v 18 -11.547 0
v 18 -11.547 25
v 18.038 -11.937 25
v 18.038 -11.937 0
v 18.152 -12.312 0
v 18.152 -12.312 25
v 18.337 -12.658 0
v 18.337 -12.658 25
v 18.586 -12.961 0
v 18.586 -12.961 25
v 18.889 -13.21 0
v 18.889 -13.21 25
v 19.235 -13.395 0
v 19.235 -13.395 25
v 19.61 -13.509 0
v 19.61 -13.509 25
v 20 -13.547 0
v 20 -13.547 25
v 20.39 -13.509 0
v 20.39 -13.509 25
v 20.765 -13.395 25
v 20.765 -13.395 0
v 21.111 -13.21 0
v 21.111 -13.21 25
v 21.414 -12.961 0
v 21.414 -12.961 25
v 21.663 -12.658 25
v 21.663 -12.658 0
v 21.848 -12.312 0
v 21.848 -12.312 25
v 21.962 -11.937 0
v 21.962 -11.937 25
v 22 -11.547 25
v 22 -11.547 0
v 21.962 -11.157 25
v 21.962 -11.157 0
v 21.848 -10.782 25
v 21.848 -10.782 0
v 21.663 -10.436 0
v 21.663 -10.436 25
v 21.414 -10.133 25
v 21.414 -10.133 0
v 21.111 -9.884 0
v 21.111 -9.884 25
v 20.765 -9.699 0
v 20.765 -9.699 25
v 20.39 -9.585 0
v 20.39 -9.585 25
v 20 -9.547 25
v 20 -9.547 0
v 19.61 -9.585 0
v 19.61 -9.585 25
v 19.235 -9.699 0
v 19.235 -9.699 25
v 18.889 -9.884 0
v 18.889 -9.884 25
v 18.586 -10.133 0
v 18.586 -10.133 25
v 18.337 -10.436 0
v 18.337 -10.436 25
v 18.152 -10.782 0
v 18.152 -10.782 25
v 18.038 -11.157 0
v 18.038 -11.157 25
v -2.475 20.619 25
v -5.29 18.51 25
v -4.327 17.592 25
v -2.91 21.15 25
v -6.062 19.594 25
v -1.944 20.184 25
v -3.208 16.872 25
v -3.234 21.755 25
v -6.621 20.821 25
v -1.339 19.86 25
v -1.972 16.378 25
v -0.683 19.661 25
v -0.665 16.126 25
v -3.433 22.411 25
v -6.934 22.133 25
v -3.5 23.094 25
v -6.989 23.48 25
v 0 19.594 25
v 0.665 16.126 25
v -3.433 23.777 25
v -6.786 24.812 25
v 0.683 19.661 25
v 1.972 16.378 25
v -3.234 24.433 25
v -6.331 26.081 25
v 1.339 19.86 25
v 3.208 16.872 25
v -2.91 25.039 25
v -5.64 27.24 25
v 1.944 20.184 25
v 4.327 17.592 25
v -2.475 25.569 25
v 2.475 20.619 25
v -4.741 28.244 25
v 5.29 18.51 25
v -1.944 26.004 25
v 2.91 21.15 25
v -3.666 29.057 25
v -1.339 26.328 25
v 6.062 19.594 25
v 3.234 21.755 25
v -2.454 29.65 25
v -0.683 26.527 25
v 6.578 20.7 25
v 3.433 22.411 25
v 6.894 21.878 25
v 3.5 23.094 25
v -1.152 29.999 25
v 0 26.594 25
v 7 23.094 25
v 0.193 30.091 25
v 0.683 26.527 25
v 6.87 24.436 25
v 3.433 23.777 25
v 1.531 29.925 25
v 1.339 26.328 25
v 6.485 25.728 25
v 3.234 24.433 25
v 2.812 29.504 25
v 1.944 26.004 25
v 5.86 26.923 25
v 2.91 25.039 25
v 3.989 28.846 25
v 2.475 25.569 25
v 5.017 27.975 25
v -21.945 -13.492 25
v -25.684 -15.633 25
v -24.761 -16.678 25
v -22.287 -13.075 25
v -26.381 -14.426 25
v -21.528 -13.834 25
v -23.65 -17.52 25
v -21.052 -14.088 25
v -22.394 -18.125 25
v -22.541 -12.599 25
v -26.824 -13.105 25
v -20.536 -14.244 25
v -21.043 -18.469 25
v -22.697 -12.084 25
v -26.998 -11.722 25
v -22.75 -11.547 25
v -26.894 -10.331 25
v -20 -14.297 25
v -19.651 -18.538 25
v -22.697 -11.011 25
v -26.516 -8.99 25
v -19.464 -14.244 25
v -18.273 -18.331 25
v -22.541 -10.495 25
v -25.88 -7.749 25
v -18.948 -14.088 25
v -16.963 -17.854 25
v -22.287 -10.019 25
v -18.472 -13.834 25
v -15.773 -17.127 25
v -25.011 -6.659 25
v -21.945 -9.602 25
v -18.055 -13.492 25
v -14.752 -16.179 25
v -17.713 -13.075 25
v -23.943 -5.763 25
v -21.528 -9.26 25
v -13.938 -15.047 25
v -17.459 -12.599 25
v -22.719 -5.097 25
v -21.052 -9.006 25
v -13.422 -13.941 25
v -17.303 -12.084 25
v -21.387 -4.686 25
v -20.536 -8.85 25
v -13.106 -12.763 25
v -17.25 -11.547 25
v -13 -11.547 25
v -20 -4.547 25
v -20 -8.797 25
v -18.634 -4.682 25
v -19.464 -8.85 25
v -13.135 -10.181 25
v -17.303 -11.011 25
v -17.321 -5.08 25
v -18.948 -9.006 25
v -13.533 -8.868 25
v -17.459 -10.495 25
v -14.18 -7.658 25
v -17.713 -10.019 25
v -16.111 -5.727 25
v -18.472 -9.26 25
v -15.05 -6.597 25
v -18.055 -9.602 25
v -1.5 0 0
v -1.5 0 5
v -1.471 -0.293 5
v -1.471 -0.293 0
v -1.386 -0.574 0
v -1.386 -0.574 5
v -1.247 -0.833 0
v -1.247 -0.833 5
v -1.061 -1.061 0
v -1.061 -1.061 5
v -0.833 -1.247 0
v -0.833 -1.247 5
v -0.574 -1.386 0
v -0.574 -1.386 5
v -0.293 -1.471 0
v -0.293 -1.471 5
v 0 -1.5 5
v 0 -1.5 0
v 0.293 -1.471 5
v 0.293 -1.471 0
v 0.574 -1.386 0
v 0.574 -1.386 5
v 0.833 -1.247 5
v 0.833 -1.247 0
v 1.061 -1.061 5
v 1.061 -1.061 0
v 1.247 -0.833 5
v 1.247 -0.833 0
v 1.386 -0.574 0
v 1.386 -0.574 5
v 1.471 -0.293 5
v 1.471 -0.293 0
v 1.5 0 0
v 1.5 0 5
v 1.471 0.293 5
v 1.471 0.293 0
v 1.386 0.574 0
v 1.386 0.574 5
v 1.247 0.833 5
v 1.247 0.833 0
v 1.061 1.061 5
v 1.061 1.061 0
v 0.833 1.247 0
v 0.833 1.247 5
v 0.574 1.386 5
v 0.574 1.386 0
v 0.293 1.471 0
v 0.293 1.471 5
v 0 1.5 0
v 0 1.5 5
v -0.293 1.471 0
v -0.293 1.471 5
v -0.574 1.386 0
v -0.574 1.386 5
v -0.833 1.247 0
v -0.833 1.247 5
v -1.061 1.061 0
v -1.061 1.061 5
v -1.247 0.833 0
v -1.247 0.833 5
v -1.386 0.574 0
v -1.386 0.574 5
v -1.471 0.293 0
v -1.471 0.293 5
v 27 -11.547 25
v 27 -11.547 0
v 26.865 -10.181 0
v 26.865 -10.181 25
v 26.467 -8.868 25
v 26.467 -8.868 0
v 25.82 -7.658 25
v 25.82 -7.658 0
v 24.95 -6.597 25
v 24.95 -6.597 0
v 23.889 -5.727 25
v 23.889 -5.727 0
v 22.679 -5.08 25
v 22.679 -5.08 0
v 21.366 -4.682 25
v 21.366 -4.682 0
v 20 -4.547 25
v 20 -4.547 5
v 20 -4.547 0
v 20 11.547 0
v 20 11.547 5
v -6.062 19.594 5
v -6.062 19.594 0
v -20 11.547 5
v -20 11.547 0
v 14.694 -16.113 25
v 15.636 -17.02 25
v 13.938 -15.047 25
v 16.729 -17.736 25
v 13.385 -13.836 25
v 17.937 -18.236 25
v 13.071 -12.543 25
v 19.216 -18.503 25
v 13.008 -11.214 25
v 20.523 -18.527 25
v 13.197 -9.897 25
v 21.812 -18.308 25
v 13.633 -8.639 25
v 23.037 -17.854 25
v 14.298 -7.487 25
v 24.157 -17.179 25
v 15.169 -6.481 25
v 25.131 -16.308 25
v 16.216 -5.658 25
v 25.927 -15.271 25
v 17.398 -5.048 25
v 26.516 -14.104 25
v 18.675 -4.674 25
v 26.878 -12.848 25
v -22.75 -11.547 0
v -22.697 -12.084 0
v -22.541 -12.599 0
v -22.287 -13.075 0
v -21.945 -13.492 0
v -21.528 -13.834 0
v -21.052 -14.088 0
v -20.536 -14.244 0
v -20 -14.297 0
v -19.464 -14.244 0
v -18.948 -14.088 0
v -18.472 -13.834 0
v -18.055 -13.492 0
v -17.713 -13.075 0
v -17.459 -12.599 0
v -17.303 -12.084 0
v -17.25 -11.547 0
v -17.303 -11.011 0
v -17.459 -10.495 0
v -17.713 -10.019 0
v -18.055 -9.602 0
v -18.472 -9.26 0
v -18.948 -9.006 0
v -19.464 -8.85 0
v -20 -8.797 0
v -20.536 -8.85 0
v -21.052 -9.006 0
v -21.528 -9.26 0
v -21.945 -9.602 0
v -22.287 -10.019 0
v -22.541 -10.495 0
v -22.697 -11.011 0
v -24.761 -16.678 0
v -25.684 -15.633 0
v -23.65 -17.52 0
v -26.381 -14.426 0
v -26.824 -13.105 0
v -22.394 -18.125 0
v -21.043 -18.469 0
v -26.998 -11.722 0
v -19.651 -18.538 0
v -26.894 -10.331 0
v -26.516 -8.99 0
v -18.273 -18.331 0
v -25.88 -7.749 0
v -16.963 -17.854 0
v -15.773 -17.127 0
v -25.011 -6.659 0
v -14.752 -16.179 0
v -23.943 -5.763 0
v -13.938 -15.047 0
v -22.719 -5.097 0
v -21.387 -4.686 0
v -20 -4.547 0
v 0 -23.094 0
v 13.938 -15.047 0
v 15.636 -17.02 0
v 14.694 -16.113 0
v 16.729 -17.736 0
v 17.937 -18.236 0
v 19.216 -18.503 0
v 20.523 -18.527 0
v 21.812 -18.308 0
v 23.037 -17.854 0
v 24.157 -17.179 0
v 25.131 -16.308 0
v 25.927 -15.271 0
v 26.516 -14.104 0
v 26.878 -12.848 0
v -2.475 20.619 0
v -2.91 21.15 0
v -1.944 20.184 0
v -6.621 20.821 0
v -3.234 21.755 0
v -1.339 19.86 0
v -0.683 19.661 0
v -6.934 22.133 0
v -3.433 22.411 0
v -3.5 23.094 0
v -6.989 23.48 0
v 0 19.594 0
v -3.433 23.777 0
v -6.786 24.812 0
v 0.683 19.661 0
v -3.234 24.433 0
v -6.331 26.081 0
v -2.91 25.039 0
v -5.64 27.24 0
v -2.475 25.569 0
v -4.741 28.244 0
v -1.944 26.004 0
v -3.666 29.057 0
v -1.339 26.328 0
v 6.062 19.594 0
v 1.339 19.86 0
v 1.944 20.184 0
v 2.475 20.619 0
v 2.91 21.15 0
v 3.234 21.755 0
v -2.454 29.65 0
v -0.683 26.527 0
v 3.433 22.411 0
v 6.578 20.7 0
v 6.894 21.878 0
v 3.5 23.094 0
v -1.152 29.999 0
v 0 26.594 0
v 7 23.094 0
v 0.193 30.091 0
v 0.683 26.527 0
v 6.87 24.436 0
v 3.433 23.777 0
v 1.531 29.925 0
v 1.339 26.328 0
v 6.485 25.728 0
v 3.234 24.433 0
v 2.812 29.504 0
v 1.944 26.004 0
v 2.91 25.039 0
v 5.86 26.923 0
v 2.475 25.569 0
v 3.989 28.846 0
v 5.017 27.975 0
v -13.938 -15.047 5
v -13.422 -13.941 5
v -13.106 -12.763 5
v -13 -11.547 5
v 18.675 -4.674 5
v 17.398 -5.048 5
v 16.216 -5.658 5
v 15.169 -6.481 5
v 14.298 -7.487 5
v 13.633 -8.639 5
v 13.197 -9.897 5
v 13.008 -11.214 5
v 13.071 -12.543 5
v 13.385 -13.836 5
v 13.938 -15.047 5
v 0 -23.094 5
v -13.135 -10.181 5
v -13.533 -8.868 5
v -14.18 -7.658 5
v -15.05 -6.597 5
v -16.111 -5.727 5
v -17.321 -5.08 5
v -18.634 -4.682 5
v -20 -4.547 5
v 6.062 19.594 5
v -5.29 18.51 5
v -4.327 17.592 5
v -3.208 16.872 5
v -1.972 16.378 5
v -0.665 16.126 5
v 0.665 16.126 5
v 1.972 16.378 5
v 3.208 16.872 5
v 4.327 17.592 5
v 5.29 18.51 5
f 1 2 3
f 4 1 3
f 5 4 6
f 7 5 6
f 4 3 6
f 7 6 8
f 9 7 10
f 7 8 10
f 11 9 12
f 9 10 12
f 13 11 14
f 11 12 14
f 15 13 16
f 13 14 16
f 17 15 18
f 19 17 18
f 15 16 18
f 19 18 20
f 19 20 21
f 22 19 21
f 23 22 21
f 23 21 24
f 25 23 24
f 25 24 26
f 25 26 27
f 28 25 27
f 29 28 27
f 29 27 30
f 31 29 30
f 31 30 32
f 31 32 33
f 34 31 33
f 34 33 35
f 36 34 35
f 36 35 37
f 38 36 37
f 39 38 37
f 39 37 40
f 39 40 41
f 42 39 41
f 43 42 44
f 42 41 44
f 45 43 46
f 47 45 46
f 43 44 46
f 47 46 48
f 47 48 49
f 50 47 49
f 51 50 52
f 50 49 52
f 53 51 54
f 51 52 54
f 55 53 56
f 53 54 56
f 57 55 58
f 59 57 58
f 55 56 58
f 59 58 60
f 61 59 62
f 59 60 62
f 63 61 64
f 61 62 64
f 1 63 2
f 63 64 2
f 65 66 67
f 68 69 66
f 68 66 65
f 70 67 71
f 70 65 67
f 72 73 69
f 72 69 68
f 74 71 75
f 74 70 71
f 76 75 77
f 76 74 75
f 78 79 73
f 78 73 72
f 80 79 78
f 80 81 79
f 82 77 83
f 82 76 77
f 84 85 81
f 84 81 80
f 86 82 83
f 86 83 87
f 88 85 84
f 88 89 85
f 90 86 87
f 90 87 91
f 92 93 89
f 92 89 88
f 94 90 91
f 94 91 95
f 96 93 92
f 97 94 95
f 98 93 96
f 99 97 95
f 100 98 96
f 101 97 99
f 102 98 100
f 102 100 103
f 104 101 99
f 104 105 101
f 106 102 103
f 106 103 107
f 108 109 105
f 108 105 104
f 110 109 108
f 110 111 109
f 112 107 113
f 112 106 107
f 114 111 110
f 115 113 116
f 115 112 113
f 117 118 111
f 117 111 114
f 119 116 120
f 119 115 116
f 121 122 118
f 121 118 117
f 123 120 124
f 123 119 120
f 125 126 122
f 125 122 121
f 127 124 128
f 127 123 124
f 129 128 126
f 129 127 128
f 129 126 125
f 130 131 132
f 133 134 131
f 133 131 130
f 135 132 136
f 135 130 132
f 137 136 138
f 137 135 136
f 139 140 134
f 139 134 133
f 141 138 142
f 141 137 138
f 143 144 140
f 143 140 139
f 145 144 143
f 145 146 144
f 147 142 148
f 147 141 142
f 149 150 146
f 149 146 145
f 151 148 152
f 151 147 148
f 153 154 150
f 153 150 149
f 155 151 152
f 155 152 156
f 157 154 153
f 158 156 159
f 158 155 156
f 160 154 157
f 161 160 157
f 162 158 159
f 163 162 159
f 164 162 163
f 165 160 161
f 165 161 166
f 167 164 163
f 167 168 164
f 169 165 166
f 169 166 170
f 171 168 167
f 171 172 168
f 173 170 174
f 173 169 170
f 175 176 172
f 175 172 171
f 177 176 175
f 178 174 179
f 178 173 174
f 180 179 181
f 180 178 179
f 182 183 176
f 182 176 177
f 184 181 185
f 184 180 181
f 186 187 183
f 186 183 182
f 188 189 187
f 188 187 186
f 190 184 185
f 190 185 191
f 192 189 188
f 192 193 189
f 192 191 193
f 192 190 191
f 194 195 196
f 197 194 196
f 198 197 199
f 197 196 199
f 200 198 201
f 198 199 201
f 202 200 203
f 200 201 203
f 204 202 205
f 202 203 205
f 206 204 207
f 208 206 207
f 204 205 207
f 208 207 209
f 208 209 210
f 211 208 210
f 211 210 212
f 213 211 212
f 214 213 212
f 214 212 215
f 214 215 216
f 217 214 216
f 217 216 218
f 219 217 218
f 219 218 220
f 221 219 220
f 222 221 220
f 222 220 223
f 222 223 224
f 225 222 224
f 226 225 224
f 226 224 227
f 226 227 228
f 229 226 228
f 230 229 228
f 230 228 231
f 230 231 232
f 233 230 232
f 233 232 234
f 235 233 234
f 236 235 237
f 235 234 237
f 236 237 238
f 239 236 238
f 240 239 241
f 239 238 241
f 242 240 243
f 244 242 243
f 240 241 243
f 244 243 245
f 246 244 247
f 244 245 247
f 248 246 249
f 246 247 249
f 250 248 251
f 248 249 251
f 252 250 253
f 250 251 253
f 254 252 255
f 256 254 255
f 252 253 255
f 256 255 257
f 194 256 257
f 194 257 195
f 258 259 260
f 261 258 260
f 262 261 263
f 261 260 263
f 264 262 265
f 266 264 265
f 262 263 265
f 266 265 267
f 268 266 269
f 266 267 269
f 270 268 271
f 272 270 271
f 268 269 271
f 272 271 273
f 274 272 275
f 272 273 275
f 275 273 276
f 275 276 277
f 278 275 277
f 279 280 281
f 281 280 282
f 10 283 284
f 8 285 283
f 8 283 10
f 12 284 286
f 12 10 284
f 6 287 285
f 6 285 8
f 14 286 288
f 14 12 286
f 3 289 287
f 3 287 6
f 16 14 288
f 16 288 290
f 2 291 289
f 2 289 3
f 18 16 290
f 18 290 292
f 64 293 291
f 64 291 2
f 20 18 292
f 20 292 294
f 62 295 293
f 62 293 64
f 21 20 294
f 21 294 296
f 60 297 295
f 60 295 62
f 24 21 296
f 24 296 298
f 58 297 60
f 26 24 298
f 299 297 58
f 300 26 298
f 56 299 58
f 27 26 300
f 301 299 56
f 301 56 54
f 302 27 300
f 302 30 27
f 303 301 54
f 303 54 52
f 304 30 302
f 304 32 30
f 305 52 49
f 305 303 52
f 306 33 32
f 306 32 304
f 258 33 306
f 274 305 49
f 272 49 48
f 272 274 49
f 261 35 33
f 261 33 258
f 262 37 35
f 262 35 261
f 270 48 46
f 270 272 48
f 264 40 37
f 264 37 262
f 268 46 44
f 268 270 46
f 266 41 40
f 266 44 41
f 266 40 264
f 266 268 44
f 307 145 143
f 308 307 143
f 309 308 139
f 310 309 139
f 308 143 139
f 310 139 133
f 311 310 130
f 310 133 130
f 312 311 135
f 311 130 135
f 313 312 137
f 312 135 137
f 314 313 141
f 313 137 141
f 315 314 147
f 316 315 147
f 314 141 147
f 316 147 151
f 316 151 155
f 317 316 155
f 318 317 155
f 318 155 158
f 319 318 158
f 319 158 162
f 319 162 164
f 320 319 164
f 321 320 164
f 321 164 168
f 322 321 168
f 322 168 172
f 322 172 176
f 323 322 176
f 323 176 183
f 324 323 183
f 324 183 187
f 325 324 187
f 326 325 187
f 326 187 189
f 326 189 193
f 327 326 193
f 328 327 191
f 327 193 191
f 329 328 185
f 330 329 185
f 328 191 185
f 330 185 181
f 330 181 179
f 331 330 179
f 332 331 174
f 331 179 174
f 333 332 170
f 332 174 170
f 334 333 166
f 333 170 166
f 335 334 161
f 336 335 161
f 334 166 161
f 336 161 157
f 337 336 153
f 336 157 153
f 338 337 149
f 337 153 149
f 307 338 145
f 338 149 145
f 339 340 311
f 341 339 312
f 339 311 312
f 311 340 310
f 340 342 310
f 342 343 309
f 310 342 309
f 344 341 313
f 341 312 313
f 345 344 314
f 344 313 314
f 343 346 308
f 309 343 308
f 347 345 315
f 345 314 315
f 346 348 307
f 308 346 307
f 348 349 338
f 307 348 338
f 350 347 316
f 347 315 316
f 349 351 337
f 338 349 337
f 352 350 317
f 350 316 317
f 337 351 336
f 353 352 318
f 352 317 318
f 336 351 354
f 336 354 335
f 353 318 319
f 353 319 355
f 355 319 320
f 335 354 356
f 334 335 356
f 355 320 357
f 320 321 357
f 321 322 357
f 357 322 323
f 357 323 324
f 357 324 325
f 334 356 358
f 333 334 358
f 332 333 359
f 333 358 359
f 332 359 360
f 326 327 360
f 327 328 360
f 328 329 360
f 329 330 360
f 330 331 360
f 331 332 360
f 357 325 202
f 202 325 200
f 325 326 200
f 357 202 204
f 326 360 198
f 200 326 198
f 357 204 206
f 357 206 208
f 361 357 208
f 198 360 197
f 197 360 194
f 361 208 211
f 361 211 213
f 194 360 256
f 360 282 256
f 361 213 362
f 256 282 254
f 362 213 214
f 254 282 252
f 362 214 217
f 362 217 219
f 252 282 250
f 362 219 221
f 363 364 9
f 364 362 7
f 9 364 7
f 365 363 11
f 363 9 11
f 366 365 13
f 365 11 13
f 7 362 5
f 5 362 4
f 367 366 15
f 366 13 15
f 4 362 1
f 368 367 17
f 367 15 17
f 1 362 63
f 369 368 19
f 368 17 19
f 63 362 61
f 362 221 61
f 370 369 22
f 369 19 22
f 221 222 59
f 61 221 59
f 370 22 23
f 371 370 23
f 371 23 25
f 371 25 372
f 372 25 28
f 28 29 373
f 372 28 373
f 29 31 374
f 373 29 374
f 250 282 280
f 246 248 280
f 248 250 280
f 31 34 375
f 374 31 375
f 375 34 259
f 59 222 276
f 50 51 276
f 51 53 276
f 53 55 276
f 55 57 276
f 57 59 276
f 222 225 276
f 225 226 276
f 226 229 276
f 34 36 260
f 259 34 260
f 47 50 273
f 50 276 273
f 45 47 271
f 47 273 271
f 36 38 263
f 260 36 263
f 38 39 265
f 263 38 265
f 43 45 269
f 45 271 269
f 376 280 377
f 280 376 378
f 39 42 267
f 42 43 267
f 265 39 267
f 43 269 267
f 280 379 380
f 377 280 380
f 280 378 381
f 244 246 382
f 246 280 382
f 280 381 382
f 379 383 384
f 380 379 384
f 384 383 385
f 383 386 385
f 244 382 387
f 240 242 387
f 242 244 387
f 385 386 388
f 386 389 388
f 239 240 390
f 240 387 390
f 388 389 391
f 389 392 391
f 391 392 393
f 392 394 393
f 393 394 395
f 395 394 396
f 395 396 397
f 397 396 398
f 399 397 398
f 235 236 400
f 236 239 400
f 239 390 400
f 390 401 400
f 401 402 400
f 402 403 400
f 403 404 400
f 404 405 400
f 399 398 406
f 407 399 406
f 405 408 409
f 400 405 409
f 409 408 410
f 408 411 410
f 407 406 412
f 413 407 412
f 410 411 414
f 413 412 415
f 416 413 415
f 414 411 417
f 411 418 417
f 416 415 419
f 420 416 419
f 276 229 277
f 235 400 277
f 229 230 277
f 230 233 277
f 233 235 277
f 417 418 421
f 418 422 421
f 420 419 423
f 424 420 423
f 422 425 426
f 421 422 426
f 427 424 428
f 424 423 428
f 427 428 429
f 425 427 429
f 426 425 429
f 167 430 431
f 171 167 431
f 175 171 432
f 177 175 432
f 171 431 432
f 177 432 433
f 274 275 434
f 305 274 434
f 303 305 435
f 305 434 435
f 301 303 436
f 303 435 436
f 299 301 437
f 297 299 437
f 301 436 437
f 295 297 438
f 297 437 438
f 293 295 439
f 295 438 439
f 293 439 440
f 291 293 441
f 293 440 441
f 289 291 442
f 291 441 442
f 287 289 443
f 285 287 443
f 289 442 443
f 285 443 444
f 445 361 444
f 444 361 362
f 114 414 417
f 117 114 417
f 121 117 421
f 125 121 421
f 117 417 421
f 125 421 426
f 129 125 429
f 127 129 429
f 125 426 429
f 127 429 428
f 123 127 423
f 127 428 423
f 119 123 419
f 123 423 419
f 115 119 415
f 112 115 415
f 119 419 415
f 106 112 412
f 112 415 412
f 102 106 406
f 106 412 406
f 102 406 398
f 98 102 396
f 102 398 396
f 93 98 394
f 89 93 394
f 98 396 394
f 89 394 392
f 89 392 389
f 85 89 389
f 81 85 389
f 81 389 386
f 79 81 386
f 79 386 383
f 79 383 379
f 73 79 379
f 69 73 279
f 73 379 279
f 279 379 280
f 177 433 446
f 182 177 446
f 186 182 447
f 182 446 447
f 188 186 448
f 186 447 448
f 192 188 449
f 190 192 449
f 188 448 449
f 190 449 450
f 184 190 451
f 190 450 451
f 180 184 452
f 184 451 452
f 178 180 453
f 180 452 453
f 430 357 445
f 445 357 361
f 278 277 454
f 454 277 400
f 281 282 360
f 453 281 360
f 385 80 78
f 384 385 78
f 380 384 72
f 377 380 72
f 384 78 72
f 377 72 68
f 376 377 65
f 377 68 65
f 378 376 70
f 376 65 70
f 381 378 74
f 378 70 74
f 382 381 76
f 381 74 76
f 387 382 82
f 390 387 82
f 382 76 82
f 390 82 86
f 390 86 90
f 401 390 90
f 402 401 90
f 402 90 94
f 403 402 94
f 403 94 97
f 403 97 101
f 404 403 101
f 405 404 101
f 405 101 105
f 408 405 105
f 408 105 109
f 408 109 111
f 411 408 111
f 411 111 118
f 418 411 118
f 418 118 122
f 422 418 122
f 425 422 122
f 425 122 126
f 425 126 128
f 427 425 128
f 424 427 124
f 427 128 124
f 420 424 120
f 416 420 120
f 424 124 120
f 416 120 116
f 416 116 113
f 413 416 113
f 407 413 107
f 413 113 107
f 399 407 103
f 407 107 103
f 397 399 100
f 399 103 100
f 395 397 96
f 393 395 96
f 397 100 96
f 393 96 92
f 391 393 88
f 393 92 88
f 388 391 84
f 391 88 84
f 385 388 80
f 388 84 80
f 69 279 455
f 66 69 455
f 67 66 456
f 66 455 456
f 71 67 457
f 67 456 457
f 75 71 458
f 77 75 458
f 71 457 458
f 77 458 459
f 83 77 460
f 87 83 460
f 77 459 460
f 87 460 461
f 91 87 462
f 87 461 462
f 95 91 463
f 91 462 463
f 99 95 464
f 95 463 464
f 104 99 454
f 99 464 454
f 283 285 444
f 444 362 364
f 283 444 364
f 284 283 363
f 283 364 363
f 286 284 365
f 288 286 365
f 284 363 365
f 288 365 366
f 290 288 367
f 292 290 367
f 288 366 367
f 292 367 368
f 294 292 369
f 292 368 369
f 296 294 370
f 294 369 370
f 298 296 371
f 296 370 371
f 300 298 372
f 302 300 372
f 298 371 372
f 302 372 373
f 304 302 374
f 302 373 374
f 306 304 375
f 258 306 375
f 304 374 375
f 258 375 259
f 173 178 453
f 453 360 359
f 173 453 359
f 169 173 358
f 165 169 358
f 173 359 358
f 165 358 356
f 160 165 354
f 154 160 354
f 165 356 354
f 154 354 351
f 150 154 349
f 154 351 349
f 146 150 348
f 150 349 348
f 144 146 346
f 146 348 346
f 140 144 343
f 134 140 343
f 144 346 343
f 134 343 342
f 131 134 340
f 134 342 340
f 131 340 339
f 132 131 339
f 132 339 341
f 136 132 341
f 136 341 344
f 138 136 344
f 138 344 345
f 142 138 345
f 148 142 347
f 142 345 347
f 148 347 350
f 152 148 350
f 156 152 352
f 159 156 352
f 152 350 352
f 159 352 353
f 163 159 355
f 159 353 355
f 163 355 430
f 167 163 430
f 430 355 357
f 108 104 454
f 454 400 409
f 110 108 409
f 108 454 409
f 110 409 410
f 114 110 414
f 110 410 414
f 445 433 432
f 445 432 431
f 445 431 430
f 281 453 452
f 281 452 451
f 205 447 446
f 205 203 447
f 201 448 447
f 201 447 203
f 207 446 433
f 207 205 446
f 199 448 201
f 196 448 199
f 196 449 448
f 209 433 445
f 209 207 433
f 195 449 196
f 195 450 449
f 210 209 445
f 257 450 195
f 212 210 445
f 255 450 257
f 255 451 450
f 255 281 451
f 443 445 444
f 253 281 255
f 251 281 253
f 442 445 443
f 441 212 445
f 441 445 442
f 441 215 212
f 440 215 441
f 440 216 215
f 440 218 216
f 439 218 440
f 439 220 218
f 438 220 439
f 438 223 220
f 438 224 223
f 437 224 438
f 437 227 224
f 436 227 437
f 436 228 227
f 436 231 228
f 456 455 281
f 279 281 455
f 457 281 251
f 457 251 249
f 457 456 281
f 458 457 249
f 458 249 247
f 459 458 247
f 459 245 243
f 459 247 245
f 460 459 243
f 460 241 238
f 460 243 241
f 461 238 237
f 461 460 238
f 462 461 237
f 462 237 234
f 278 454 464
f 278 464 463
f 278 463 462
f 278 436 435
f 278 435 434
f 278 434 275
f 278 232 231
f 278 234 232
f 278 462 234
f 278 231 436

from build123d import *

# Parameters (mm, degrees)
F1_DEPTH = 5
F2_DEPTH = 25
F3_D     = 7
F4_D     = 5.5
F5_D     = 4
F6_D     = 3


with BuildPart() as f1:
    # F0 (on Top) → F1 (new body)
    with BuildSketch(Plane.XY):
        with BuildLine():
            Line((20, -4.5470053838), (20, 11.5470053838))
            Line((20, 11.5470053838), (6.0621778265, 19.5940107676))
            ThreePointArc((6.0621778265, 19.5940107676), (0, 16.0940107676), (-6.0621778265, 19.5940107676))
            Line((-6.0621778265, 19.5940107676), (-20, 11.5470053838))
            Line((-20, 11.5470053838), (-20, -4.5470053838))
            ThreePointArc((-20, -4.5470053838), (-15.0502525317, -6.5972579155), (-13, -11.5470053838))
            ThreePointArc((-13, -11.5470053838), (-13.238519216, -13.3587386995), (-13.9378221735, -15.0470053838))
            Line((-13.9378221735, -15.0470053838), (0, -23.0940107676))
            Line((0, -23.0940107676), (13.9378221735, -15.0470053838))
            ThreePointArc((13.9378221735, -15.0470053838), (13.9378221735, -8.0470053838), (20, -4.5470053838))
        make_face()
    extrude(amount=F1_DEPTH)

    # F0 (on Top) → F2 (join)
    with BuildSketch(Plane.XY):
        with BuildLine():
            ThreePointArc((-20, -4.5470053838), (-26.0621778265, -15.0470053838), (-13.9378221735, -15.0470053838))
            Line((-13.9378221735, -15.0470053838), (-20, -11.5470053838))
            Line((-20, -11.5470053838), (-20, -4.5470053838))
        make_face()
        with BuildLine():
            Line((-20, -11.5470053838), (-13.9378221735, -15.0470053838))
            ThreePointArc((-13.9378221735, -15.0470053838), (-13.238519216, -13.3587386995), (-13, -11.5470053838))
            ThreePointArc((-13, -11.5470053838), (-15.0502525317, -6.5972579155), (-20, -4.5470053838))
            Line((-20, -4.5470053838), (-20, -11.5470053838))
        make_face()
        with BuildLine():
            Line((0, 23.0940107676), (6.0621778265, 19.5940107676))
            ThreePointArc((6.0621778265, 19.5940107676), (6.761480784, 21.2822774519), (7, 23.0940107676))
            ThreePointArc((7, 23.0940107676), (-1.8117333157, 29.8554915516), (-6.0621778265, 19.5940107676))
            Line((-6.0621778265, 19.5940107676), (0, 23.0940107676))
        make_face()
        with BuildLine():
            ThreePointArc((-6.0621778265, 19.5940107676), (0, 16.0940107676), (6.0621778265, 19.5940107676))
            Line((6.0621778265, 19.5940107676), (0, 23.0940107676))
            Line((0, 23.0940107676), (-6.0621778265, 19.5940107676))
        make_face()
        with BuildLine():
            ThreePointArc((27, -11.5470053838), (24.9497474683, -6.5972579155), (20, -4.5470053838))
            Line((20, -4.5470053838), (20, -11.5470053838))
            Line((20, -11.5470053838), (13.9378221735, -15.0470053838))
            ThreePointArc((13.9378221735, -15.0470053838), (21.8117333157, -18.3084861678), (27, -11.5470053838))
        make_face()
        with BuildLine():
            Line((20, -11.5470053838), (20, -4.5470053838))
            ThreePointArc((20, -4.5470053838), (13.9378221735, -8.0470053838), (13.9378221735, -15.0470053838))
            Line((13.9378221735, -15.0470053838), (20, -11.5470053838))
        make_face()
    extrude(amount=F2_DEPTH)

    # F3 (through all)
    with Locations(Plane(origin=(0, 0, 0), x_dir=(1, 0, 0), z_dir=(0, 0, -1))):
        with Locations((0, -23.0940107676)):
            Hole(F3_D / 2)

    # F4 (through all)
    with Locations(Plane(origin=(0, 0, 0), x_dir=(1, 0, 0), z_dir=(0, 0, -1))):
        with Locations((-20, 11.5470053838)):
            Hole(F4_D / 2)

    # F5 (through all)
    with Locations(Plane(origin=(0, 0, 0), x_dir=(1, 0, 0), z_dir=(0, 0, -1))):
        with Locations((20, 11.5470053838)):
            Hole(F5_D / 2)

    # F6 (through all)
    with Locations(Plane(origin=(0, 0, 0), x_dir=(1, 0, 0), z_dir=(0, 0, -1))):
        with Locations((0, 0)):
            Hole(F6_D / 2)


solid = f1.part
